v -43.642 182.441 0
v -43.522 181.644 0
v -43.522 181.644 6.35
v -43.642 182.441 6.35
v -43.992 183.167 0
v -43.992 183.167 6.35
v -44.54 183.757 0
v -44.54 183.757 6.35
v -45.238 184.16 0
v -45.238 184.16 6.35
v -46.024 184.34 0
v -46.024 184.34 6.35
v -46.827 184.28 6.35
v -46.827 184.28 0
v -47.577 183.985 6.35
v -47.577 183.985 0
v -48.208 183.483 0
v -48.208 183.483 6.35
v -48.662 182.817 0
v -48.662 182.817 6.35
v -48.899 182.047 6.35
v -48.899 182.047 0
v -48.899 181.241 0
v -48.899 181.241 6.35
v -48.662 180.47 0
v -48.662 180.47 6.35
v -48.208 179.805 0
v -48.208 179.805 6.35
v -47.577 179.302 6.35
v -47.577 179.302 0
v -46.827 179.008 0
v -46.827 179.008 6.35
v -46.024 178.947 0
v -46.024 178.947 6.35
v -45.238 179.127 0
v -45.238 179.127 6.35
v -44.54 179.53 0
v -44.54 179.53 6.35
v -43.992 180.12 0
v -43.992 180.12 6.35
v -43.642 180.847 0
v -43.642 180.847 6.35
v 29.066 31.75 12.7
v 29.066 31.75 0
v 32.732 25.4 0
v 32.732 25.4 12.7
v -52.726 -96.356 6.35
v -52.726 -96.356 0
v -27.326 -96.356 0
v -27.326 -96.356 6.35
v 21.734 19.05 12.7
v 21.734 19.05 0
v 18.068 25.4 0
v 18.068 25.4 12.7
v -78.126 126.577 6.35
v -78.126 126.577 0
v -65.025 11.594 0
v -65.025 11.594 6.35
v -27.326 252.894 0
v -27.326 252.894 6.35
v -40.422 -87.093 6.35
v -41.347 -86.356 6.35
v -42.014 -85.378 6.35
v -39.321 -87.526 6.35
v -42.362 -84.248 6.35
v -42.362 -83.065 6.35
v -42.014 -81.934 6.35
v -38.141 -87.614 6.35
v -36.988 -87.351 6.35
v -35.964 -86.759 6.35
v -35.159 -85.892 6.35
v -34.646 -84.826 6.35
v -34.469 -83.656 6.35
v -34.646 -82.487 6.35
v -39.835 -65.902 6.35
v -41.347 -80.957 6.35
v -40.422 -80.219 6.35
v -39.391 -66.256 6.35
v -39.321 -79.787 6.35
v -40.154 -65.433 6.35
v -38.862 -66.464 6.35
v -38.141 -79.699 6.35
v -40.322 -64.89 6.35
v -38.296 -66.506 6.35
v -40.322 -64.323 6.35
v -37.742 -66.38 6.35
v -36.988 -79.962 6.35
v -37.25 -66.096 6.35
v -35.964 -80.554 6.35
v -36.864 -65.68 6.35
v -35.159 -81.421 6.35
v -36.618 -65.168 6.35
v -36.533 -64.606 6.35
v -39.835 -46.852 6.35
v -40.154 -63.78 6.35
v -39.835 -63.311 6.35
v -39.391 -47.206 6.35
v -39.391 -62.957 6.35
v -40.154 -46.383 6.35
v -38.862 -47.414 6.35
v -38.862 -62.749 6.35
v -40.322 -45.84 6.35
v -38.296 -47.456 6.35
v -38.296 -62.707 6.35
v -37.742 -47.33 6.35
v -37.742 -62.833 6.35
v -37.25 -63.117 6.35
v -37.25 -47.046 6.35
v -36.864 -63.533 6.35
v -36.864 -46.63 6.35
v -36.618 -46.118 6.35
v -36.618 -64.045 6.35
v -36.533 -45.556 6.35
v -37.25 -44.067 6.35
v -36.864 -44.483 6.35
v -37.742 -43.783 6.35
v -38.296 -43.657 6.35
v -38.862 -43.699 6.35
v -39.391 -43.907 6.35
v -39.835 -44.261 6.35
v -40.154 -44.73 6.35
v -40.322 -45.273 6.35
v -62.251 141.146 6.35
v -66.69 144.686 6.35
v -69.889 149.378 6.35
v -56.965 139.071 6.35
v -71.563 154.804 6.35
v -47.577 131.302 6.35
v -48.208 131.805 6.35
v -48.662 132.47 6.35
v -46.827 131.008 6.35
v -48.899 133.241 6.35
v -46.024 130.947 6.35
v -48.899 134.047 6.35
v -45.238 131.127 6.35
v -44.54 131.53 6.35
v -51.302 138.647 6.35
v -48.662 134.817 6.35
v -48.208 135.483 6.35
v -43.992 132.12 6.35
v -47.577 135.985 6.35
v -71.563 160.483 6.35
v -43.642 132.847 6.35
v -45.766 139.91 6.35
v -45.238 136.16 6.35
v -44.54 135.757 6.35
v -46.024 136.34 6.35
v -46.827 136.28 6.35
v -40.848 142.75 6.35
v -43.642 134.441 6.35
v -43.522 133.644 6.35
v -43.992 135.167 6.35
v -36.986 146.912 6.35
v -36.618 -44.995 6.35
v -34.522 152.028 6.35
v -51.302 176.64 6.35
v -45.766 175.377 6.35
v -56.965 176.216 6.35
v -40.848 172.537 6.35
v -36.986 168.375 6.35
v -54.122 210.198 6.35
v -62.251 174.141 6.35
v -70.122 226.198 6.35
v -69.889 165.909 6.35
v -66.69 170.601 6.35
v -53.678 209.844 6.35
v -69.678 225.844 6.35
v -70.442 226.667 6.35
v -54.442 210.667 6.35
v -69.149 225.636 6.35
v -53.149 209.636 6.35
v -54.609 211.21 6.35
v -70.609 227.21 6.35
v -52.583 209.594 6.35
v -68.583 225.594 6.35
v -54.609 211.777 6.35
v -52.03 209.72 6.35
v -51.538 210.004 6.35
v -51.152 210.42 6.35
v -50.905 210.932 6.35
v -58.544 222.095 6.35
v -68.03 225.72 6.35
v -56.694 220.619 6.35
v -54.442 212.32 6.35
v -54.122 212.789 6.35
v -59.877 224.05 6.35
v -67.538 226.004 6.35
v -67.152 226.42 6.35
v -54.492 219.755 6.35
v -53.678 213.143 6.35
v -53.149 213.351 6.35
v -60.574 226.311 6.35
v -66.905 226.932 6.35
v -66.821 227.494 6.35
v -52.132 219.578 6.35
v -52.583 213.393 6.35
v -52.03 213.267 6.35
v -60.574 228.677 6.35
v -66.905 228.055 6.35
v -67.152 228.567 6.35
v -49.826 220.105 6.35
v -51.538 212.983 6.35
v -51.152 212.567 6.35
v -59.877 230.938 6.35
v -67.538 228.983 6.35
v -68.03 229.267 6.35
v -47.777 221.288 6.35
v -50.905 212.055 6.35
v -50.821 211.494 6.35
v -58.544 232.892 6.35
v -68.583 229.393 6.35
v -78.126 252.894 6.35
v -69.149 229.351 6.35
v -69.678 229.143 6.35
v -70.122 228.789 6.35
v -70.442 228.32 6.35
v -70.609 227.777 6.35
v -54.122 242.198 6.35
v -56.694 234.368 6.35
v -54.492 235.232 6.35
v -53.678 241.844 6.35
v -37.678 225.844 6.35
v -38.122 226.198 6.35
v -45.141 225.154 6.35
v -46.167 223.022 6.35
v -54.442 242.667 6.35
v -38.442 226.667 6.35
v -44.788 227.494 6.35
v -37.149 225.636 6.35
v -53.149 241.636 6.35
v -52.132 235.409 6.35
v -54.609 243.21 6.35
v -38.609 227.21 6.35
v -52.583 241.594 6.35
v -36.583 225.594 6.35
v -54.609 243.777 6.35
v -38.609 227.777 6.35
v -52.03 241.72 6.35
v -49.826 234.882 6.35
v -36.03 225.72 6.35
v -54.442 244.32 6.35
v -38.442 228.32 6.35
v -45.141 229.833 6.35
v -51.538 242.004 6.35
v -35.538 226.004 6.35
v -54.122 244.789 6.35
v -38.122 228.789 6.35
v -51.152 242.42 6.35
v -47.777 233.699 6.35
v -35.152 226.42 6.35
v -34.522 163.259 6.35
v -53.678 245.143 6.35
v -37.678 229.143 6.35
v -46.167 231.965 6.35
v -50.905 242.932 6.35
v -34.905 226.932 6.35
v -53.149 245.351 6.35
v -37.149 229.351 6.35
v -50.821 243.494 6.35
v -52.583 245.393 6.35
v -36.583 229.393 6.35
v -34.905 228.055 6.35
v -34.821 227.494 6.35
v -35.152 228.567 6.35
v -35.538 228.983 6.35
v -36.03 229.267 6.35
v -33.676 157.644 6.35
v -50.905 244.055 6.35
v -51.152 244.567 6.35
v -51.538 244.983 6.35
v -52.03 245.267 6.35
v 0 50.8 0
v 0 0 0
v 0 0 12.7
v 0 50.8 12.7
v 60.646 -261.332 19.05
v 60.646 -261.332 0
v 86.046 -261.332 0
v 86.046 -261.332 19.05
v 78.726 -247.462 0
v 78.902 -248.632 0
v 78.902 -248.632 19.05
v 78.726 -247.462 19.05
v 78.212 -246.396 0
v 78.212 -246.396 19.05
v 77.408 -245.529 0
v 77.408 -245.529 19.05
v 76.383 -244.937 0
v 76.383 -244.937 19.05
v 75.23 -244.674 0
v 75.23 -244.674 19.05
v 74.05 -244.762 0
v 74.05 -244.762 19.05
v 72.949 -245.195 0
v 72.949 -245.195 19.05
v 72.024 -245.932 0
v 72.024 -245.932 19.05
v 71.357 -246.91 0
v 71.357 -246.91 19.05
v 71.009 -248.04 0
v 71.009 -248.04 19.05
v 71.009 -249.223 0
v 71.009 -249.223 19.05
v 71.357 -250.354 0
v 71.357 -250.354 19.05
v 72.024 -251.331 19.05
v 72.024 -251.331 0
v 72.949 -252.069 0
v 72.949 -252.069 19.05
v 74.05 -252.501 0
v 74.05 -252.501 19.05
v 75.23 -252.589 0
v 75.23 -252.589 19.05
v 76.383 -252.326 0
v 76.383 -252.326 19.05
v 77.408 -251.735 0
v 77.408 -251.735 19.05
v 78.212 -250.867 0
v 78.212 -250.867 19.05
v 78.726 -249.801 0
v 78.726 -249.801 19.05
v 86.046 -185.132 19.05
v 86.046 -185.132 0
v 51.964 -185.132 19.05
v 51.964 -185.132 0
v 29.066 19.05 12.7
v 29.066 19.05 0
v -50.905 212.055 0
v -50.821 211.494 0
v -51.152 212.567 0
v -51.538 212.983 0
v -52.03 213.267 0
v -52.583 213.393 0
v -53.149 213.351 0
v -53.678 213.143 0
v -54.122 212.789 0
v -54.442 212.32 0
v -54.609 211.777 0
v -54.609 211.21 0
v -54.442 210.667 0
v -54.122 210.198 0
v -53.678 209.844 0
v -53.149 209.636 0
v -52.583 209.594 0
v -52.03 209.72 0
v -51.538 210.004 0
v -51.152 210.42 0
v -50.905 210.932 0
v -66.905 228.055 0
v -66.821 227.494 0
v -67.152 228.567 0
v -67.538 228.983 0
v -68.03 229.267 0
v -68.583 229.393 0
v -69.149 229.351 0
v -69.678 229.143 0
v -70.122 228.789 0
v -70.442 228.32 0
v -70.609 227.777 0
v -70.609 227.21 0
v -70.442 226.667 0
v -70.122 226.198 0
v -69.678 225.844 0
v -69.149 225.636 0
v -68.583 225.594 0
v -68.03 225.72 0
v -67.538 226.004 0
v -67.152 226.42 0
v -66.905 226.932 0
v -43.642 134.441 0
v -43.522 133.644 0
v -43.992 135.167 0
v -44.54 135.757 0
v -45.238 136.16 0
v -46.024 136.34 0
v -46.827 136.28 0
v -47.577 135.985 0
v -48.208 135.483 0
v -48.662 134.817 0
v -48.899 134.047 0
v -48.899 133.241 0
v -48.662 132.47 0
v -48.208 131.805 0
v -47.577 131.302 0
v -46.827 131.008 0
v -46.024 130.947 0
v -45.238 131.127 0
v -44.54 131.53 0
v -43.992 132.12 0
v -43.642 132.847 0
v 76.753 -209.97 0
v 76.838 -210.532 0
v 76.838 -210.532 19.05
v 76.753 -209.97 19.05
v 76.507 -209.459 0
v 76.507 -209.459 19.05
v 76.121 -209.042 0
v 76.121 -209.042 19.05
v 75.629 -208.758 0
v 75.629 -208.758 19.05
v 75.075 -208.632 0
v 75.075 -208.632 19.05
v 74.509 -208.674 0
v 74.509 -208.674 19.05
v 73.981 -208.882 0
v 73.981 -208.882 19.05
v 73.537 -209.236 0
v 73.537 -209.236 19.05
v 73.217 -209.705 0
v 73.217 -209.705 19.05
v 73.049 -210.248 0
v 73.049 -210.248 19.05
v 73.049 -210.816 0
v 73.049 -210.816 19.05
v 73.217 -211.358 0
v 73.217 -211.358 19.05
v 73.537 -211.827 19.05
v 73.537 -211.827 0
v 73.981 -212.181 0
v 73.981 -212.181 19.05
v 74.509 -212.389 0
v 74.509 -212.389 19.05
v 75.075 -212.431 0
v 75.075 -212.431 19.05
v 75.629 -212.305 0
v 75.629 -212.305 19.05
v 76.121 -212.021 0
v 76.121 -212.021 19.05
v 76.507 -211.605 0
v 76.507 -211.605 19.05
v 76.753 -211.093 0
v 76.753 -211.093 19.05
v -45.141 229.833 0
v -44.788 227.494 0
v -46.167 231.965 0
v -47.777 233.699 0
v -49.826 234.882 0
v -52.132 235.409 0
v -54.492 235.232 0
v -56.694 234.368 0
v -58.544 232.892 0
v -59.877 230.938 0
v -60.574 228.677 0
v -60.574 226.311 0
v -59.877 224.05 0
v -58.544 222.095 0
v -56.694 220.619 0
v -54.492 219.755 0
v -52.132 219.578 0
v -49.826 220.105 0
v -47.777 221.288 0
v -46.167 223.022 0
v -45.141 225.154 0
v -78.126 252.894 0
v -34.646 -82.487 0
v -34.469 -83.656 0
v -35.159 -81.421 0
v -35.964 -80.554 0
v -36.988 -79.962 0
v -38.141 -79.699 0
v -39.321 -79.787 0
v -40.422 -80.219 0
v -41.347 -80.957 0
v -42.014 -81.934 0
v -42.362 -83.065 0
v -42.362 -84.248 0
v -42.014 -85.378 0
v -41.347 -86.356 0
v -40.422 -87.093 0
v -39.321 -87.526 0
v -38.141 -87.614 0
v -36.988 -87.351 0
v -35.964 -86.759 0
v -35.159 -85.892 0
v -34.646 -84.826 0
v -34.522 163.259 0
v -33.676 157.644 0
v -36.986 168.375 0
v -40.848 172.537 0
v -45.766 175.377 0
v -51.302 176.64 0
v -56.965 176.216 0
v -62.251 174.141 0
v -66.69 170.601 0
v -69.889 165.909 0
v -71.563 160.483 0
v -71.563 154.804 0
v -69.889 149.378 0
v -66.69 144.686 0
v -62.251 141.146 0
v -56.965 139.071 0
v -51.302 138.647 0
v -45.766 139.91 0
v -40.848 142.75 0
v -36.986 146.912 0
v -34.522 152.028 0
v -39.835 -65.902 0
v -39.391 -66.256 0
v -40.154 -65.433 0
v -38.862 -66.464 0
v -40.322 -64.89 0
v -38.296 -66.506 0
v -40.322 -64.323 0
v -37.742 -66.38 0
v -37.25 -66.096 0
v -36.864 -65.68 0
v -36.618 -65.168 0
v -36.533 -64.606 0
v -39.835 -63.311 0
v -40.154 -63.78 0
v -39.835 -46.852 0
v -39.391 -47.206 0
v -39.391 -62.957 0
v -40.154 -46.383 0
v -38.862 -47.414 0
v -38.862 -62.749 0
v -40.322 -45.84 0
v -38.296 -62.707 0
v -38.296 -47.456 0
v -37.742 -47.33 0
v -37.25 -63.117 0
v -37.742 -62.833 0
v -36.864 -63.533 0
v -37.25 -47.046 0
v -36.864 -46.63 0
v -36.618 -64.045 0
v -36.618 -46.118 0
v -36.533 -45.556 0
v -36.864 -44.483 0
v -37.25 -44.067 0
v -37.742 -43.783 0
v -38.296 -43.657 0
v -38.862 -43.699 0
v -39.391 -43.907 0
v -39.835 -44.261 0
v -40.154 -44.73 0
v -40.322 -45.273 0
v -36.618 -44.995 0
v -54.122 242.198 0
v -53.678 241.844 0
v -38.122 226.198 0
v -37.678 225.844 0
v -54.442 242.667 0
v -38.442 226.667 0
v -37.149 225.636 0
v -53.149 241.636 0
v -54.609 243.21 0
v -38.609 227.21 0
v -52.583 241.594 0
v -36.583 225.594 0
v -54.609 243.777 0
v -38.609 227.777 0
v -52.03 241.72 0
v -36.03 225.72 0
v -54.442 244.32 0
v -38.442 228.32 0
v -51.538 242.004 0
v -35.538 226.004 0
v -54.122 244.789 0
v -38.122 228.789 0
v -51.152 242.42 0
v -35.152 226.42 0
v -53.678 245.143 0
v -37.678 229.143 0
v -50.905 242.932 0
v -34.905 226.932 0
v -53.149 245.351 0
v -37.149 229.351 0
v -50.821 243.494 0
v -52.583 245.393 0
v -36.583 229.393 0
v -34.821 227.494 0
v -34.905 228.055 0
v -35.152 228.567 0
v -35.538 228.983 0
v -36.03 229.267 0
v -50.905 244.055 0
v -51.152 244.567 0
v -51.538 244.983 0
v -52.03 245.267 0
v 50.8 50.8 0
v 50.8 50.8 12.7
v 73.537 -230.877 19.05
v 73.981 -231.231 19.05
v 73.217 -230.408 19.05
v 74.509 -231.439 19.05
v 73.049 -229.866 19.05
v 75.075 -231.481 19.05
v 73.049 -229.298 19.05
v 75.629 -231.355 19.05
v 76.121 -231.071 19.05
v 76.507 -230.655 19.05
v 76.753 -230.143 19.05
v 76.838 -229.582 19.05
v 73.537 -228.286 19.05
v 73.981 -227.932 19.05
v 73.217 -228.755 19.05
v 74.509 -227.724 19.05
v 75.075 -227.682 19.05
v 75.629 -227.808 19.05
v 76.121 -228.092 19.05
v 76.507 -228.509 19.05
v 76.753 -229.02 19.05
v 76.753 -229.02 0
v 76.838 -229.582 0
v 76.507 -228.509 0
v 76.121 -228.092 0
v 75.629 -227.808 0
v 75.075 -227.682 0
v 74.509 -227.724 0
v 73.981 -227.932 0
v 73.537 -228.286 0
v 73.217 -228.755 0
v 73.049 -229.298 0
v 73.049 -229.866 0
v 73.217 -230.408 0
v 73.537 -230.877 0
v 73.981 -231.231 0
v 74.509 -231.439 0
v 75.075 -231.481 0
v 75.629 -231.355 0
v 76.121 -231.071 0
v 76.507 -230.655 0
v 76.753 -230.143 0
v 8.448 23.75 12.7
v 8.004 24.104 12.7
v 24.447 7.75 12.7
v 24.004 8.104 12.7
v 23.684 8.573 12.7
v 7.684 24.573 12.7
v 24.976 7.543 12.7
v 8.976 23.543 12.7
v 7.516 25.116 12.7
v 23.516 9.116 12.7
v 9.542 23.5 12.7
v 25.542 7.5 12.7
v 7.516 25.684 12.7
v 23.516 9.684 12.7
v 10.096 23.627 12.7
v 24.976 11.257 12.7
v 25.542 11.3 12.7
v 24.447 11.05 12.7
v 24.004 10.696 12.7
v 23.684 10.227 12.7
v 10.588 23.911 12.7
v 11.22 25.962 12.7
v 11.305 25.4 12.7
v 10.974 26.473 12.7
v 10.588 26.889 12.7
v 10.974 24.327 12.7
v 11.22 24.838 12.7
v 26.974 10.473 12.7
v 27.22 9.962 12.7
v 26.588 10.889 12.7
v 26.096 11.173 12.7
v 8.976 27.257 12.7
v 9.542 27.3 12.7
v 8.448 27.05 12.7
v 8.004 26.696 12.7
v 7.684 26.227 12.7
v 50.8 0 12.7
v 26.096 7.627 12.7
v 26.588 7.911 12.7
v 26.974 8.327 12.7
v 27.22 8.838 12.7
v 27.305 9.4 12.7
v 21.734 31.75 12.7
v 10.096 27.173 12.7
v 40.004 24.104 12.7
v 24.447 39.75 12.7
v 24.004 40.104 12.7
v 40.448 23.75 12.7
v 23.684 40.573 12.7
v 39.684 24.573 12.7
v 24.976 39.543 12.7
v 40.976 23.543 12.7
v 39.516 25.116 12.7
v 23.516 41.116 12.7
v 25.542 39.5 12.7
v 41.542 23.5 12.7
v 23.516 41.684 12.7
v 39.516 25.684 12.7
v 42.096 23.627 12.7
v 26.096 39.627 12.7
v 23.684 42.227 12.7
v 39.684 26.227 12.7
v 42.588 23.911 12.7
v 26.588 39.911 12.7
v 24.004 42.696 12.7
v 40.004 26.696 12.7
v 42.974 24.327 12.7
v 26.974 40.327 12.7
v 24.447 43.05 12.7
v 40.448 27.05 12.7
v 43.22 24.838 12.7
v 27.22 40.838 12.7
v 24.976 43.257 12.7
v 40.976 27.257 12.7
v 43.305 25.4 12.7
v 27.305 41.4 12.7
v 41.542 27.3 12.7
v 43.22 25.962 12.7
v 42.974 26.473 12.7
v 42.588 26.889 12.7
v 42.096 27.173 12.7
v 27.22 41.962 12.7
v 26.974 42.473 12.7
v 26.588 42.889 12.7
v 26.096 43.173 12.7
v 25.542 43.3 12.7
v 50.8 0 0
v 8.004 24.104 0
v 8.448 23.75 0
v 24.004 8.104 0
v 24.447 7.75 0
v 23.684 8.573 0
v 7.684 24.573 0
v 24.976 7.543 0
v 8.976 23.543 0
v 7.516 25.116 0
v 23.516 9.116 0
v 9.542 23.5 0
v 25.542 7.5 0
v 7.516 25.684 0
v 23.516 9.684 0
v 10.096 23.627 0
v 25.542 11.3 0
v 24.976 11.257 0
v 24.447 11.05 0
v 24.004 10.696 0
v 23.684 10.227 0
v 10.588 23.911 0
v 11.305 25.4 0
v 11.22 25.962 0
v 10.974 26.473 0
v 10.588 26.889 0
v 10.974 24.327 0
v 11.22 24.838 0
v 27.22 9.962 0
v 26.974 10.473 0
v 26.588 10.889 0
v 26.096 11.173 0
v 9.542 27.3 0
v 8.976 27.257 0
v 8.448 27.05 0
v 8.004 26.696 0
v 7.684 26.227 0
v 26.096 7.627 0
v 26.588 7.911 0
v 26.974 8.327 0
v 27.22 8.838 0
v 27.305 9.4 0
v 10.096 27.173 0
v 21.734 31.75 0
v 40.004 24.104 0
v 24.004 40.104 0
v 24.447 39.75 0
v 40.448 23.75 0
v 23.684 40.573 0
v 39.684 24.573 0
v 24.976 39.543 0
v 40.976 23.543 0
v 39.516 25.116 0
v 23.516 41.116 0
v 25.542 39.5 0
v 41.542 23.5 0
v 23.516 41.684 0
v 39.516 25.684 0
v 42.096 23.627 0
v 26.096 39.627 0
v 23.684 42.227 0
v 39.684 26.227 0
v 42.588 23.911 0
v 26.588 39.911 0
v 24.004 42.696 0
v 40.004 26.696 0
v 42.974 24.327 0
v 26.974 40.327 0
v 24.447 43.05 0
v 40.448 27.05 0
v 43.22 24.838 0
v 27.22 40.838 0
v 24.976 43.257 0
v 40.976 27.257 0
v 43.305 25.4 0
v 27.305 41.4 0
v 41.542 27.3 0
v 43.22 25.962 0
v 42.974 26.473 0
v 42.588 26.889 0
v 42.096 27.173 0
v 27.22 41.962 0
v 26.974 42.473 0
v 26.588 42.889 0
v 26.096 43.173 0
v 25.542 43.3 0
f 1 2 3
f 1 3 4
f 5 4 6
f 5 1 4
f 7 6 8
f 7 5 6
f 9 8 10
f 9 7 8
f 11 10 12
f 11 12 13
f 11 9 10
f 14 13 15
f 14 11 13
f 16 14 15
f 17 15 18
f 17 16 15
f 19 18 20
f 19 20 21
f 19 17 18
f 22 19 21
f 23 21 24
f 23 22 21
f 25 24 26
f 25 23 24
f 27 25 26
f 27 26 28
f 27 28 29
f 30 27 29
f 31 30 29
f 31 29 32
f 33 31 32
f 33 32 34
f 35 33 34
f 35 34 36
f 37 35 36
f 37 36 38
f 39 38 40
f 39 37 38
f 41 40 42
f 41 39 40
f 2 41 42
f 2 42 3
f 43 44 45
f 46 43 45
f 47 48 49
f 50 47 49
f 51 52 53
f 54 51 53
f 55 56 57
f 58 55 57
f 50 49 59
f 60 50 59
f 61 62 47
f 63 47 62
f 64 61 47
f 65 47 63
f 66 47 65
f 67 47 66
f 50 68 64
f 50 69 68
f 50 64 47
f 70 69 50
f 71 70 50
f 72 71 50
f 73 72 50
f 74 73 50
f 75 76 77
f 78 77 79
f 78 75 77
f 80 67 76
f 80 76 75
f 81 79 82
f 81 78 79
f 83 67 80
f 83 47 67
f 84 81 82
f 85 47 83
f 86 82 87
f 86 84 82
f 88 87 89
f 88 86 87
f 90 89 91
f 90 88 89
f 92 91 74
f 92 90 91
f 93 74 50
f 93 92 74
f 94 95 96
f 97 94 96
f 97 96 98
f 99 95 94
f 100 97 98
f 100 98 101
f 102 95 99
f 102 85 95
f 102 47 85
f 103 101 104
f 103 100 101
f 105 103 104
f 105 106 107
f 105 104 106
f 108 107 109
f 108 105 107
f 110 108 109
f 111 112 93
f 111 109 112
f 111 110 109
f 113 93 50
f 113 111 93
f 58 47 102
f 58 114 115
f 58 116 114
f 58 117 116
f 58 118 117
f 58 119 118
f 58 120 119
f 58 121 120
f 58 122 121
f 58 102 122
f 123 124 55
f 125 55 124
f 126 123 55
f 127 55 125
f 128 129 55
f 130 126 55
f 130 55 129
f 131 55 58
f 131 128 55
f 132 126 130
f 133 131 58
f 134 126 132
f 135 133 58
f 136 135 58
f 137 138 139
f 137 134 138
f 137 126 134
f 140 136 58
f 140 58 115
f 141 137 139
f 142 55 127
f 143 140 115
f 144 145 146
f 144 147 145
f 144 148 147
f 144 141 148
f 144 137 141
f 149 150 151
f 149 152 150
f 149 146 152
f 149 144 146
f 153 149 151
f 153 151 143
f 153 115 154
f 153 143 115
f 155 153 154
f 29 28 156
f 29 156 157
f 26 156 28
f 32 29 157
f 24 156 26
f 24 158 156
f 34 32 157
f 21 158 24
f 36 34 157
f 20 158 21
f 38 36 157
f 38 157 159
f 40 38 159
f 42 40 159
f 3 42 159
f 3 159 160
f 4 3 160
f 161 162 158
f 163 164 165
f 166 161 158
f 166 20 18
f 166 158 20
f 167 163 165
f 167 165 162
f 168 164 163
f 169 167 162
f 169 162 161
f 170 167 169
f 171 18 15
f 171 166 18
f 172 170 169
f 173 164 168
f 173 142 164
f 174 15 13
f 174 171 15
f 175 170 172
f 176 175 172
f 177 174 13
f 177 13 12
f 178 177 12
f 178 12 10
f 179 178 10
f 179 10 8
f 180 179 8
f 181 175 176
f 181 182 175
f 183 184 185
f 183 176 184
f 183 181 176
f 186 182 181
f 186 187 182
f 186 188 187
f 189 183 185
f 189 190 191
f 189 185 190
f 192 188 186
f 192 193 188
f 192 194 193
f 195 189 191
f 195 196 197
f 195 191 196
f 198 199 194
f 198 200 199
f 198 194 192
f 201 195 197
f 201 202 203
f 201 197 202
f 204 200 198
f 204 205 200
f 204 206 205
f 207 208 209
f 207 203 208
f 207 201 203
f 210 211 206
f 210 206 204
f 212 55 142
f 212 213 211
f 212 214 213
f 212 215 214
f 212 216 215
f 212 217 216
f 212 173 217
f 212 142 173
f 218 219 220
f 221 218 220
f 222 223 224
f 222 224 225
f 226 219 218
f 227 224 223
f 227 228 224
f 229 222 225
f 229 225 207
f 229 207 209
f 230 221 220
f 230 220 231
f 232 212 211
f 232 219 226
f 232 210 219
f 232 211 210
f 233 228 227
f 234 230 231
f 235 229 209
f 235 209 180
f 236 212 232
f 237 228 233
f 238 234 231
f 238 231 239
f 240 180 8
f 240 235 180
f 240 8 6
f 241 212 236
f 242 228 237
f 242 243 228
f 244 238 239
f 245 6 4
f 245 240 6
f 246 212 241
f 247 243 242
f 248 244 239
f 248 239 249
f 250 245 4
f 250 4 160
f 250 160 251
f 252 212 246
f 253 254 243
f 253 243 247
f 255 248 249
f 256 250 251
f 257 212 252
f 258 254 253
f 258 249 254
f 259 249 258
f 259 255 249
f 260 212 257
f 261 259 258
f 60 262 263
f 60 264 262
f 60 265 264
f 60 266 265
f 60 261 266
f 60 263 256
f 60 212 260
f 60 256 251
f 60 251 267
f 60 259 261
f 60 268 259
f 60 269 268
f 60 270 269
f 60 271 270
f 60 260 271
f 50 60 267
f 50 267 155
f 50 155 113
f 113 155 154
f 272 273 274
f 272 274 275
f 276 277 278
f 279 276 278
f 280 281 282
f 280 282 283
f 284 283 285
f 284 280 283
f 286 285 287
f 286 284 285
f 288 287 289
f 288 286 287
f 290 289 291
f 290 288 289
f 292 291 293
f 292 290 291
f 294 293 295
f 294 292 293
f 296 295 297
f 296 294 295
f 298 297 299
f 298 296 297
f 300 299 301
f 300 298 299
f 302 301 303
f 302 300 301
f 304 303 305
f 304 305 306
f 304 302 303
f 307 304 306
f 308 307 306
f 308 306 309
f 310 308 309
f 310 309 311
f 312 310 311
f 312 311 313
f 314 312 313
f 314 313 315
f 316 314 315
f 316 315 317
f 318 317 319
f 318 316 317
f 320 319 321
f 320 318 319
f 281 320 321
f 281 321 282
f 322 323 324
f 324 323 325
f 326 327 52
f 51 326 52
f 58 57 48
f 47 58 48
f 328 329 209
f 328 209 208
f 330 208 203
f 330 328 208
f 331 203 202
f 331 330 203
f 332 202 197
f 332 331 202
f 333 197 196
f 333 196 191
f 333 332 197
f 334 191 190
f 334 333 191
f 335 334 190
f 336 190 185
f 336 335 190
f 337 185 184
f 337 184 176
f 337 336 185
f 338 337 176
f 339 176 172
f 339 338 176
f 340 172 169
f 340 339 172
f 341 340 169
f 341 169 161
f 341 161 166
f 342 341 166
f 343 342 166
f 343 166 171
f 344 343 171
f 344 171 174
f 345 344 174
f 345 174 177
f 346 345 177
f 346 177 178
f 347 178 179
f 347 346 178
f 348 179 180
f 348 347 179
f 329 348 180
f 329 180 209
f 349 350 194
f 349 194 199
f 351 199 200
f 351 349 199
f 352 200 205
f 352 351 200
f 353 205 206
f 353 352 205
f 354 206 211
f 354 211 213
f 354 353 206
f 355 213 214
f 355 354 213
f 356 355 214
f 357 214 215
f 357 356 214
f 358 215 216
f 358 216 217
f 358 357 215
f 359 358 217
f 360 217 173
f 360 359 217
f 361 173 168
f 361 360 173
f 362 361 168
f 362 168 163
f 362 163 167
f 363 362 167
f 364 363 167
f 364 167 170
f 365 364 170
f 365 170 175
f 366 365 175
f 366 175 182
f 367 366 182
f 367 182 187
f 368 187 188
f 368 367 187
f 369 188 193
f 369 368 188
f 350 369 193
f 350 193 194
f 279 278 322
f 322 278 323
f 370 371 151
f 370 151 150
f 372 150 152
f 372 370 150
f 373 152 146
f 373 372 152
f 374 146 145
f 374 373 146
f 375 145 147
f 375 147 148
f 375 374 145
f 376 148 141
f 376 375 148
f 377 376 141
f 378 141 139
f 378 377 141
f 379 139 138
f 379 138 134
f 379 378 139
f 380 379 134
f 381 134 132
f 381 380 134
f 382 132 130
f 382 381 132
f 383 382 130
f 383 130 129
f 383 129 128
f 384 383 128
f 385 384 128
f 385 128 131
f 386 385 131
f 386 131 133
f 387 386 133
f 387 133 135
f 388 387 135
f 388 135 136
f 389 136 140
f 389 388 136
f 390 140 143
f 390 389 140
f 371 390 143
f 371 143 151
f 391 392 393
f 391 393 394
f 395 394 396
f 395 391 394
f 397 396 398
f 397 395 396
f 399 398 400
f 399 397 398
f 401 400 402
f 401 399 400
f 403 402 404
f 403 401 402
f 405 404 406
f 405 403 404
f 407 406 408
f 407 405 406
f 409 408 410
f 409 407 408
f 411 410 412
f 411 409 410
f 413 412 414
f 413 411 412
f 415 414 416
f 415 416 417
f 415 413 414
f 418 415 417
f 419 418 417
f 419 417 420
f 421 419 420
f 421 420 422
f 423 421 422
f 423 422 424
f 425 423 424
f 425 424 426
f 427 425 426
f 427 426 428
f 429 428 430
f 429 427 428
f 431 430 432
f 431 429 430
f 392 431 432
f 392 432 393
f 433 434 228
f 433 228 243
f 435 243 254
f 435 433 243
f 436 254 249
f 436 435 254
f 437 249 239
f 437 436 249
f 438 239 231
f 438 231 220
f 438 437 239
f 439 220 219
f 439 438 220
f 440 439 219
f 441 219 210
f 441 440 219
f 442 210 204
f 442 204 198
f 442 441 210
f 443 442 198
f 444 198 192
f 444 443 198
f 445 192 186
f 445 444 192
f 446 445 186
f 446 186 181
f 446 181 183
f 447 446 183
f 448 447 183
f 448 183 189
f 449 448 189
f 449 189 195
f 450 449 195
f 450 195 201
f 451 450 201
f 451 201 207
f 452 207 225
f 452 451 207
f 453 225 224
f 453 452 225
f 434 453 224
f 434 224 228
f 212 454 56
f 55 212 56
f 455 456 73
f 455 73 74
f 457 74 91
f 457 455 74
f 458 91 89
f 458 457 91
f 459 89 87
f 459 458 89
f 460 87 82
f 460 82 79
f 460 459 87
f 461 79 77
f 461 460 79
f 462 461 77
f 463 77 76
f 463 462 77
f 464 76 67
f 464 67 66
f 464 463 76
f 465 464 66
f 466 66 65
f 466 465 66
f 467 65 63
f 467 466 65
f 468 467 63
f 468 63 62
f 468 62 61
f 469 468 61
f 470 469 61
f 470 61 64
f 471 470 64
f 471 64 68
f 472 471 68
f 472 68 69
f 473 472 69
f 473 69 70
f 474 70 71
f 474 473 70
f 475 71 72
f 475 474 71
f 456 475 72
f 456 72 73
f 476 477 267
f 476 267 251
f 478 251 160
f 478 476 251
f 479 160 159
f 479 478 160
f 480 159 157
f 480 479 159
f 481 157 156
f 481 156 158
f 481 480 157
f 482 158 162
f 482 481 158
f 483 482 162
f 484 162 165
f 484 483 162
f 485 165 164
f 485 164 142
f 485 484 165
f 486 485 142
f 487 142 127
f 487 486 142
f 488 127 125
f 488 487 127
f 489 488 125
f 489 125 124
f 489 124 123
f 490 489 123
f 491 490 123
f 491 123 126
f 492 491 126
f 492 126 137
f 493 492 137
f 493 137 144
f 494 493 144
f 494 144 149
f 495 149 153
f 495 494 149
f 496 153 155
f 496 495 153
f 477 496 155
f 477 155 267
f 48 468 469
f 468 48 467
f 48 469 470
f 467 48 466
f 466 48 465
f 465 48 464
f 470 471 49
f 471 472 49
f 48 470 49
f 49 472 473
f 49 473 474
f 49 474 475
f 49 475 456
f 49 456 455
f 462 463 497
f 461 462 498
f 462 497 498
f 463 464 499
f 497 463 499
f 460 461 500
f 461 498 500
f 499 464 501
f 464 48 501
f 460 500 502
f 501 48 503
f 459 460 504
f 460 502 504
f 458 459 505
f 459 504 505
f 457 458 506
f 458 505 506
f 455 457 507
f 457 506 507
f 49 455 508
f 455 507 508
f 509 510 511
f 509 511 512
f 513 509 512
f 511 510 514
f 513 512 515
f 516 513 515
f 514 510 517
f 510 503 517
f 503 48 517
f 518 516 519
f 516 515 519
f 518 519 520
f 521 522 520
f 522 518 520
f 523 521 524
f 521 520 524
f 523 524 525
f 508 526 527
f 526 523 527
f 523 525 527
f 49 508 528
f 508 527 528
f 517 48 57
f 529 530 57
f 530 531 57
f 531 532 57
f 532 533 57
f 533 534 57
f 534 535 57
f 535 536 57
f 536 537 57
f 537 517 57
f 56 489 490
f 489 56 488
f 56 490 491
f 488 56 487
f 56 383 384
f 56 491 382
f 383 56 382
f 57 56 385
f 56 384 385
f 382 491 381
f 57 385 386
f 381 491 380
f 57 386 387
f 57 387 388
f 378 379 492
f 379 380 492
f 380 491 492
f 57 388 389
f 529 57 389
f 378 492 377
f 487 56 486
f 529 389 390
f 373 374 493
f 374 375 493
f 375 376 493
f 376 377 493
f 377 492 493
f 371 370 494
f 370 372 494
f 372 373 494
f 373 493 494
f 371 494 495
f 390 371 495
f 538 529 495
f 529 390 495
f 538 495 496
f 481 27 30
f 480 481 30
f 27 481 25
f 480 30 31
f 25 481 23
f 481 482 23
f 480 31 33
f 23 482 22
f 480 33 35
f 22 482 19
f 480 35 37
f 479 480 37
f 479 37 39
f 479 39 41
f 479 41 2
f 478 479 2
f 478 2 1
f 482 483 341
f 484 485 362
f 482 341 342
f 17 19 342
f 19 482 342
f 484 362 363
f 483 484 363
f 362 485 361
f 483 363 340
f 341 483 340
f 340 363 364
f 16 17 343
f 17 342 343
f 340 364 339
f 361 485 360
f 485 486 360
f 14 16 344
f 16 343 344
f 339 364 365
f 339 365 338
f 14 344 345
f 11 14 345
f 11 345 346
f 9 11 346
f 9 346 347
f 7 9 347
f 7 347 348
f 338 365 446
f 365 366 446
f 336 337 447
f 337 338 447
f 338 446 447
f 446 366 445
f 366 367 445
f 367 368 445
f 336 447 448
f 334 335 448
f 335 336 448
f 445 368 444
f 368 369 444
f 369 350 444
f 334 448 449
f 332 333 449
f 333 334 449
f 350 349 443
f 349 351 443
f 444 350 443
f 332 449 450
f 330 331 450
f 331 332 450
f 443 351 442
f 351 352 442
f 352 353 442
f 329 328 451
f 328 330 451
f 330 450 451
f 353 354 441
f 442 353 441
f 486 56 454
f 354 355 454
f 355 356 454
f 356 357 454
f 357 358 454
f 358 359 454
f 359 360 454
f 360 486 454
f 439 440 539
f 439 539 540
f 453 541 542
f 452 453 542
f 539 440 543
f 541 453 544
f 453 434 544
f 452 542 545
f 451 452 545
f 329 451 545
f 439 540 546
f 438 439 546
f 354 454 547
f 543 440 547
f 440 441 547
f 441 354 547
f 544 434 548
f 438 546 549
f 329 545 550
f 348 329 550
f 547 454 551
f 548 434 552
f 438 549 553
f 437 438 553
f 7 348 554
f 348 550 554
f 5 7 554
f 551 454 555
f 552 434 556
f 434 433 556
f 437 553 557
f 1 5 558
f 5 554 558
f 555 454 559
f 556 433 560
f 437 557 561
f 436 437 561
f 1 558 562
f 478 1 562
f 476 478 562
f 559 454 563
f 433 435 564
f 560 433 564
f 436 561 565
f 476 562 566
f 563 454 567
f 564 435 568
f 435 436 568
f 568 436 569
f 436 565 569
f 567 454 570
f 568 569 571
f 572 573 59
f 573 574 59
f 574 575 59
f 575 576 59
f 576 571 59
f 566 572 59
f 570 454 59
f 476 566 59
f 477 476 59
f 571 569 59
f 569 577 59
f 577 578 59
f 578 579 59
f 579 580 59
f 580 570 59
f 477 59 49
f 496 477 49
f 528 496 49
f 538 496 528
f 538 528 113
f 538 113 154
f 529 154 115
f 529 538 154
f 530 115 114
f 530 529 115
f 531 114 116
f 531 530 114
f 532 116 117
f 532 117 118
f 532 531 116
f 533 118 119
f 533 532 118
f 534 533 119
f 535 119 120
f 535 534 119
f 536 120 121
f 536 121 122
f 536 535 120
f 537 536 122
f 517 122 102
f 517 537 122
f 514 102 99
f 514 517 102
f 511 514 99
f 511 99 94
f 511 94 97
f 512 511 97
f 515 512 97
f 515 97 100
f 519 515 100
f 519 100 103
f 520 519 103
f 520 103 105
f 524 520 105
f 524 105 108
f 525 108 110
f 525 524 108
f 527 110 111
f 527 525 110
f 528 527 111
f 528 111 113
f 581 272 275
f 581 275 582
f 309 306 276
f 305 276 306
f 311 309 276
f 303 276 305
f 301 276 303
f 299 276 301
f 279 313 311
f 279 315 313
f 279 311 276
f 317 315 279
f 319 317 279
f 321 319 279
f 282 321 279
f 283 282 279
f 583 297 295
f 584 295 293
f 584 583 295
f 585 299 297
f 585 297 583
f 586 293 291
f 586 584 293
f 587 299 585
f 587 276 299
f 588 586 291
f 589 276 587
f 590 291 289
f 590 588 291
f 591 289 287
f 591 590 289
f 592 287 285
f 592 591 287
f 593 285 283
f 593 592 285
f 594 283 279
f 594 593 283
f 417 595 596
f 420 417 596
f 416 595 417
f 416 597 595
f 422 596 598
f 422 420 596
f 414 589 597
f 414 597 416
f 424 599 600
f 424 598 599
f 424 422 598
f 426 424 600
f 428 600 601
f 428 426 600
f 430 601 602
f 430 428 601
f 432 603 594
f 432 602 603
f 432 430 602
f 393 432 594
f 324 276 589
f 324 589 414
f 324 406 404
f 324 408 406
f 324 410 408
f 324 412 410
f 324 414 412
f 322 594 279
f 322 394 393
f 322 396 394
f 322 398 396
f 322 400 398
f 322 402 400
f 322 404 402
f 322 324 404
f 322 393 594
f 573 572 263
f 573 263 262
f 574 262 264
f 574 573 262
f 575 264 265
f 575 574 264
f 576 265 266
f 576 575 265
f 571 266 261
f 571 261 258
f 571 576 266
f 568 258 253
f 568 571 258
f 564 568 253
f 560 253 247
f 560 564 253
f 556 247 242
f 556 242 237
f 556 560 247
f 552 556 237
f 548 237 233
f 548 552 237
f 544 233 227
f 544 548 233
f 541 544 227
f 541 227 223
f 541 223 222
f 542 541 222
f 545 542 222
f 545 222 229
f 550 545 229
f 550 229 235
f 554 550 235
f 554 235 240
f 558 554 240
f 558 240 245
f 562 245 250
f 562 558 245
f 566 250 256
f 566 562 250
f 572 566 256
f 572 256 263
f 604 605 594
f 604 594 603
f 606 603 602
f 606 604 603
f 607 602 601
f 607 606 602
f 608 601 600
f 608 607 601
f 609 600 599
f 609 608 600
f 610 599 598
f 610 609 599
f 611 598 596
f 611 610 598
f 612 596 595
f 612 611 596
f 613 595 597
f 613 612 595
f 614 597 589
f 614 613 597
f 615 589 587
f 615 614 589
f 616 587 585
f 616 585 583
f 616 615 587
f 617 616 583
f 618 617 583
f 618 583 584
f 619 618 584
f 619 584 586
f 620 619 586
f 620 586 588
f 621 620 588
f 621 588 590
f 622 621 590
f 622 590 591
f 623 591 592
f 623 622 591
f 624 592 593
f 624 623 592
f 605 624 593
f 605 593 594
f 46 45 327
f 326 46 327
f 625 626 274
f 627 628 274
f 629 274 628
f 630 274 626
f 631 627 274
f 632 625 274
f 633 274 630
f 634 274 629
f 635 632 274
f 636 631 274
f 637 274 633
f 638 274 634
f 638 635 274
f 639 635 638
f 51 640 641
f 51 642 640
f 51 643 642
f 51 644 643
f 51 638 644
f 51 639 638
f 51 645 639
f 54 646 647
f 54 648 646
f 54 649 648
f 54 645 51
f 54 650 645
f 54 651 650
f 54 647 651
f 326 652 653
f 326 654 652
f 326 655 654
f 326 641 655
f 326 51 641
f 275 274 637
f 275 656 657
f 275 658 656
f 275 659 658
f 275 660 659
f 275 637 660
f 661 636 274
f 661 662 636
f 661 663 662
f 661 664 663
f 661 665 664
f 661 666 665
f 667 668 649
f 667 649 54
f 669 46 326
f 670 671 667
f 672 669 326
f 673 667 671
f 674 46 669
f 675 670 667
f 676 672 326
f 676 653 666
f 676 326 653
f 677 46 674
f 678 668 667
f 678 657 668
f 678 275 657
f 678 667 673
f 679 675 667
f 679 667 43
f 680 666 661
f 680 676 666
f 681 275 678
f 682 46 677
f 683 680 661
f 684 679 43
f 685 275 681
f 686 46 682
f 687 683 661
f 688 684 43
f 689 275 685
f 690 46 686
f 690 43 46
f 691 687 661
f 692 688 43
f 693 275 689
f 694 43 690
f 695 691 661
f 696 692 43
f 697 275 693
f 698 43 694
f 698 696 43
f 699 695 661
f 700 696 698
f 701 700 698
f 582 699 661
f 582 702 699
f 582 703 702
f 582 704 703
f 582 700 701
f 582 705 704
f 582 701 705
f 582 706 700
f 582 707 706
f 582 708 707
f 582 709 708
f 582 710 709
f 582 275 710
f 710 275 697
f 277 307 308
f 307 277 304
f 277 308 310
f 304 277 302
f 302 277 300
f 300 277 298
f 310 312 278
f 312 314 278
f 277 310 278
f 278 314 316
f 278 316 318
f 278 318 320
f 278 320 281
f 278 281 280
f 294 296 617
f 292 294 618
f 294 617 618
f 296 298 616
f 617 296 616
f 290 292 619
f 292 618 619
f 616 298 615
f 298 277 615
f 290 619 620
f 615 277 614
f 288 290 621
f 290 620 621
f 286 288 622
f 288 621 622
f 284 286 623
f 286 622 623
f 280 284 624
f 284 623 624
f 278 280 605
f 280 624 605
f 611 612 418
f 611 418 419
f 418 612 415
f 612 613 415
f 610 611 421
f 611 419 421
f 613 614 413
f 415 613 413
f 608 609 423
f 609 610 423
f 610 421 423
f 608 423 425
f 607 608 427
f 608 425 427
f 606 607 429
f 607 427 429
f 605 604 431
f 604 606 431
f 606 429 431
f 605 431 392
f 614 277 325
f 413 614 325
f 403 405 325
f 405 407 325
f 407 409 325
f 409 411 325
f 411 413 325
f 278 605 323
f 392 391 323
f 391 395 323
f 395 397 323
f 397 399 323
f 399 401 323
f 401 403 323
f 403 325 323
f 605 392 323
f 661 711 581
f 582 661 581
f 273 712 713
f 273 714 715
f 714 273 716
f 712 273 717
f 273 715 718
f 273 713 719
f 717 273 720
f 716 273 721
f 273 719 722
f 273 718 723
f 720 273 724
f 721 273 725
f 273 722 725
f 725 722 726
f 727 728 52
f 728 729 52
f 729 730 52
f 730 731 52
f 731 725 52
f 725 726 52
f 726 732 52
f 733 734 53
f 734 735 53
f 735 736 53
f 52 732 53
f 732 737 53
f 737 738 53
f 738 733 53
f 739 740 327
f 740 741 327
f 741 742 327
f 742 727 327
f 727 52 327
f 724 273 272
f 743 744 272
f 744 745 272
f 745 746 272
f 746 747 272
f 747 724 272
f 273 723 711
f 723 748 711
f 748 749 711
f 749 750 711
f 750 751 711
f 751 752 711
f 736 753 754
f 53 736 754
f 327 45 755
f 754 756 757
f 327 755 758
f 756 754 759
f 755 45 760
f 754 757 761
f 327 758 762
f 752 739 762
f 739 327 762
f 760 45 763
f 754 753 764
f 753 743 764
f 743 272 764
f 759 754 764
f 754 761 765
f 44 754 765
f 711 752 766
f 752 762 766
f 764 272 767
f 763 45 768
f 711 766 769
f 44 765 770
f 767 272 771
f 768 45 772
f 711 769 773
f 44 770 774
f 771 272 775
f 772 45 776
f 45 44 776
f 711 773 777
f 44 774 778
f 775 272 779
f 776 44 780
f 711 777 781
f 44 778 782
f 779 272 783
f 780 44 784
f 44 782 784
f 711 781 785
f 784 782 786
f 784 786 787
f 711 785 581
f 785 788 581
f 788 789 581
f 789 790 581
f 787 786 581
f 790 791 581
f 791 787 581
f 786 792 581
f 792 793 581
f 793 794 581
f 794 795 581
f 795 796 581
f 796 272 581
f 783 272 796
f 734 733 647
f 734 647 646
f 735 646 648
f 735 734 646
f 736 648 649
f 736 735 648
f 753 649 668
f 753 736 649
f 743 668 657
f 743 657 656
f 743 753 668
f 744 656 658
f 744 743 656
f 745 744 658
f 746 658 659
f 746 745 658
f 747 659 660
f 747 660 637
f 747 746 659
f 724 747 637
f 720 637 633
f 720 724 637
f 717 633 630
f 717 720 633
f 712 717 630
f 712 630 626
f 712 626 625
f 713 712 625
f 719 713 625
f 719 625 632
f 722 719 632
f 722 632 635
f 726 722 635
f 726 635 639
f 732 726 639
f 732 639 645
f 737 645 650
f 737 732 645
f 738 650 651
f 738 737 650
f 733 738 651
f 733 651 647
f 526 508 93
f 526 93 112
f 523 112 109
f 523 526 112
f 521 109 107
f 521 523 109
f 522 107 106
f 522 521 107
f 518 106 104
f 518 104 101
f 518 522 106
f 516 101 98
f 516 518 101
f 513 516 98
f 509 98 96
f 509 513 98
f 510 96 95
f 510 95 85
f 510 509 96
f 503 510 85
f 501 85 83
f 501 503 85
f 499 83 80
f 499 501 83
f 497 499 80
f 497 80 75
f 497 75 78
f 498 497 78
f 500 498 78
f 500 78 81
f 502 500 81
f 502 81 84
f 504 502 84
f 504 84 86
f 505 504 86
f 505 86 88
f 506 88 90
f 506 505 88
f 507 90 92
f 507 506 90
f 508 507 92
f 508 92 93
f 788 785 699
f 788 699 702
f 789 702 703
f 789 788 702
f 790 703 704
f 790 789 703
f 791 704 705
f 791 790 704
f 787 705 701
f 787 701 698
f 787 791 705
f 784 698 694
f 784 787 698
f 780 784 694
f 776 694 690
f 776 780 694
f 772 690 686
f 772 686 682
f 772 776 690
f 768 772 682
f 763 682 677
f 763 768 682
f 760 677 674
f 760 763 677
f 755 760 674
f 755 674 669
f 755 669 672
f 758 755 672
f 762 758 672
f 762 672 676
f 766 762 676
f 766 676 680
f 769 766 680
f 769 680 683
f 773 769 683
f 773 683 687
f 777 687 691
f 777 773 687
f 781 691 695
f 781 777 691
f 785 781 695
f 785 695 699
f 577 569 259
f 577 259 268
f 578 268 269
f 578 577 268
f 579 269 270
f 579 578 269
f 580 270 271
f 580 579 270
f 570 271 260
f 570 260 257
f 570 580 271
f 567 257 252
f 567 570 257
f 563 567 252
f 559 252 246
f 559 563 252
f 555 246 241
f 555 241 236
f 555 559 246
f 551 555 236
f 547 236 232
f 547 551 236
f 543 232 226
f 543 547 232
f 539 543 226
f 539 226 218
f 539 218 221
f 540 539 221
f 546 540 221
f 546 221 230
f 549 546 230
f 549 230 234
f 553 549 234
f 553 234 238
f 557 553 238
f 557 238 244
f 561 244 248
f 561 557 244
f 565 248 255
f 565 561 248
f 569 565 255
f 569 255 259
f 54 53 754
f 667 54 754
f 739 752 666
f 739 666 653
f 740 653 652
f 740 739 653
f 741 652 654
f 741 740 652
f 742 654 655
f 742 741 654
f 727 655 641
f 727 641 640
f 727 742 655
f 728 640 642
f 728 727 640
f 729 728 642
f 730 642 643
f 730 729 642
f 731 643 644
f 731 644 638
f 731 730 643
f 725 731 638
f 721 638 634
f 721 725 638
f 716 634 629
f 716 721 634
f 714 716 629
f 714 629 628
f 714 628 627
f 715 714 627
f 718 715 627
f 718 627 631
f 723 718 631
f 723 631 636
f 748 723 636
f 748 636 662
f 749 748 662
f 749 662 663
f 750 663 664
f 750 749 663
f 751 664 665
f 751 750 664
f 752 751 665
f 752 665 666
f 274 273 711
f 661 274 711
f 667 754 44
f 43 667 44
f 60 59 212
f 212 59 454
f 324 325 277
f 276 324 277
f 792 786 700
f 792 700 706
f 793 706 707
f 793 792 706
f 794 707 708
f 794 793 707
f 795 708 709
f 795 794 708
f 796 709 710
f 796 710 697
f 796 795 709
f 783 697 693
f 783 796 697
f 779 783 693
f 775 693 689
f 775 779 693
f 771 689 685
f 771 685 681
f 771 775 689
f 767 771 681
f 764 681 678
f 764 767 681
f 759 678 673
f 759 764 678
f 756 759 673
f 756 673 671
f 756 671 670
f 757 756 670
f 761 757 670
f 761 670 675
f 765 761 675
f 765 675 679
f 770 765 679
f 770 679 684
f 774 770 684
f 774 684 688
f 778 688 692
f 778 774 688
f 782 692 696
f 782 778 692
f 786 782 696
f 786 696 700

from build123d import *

# Parameters (mm, degrees)
F0_R     = 3.96875
F0_R_2   = 1.905
F0_R_3   = 7.9375
F0_R_4   = 19.05
F0_R_5   = 2.703777
F1_DEPTH = 6.35
F2_W     = 50.8
F2_H     = 50.8
F2_R     = 1.905
F3_DEPTH = 12.7
F4_R     = 3.96875
F4_R_2   = 1.905
F5_DEPTH = 19.05


with BuildPart() as f1:
    # F0 (on Top) → F1 (new body)
    with BuildSketch(Plane.XY):
        Polygon((-27.325561, -96.356438), (-27.325561, 11.593562), (-65.02491, 11.593562), (-52.725561, -96.356438), align=None)
        with Locations((-38.438061, -83.656438)):
            Circle(F0_R, mode=Mode.SUBTRACT)
        with Locations((-38.438061, -64.606438)):
            Circle(F0_R_2, mode=Mode.SUBTRACT)
        with Locations((-38.438061, -45.556438)):
            Circle(F0_R_2, mode=Mode.SUBTRACT)
        Polygon((-27.325561, 252.893562), (-78.125561, 252.893562), (-78.125561, 126.576501), (-65.02491, 11.593562), (-27.325561, 11.593562), align=None)
        with Locations((-68.725561, 227.493562)):
            Circle(F0_R_2, mode=Mode.SUBTRACT)
        with Locations((-52.725561, 211.493562)):
            Circle(F0_R_2, mode=Mode.SUBTRACT)
        with Locations((-52.725561, 227.493562)):
            Circle(F0_R_3, mode=Mode.SUBTRACT)
        with Locations((-52.725561, 243.493562)):
            Circle(F0_R_2, mode=Mode.SUBTRACT)
        with Locations((-52.725561, 157.643562)):
            Circle(F0_R_4, mode=Mode.SUBTRACT)
        with Locations((-46.225561, 133.643562)):
            Circle(F0_R_5, mode=Mode.SUBTRACT)
        with Locations((-46.225561, 181.643562)):
            Circle(F0_R_5, mode=Mode.SUBTRACT)
        with Locations((-36.725561, 227.493562)):
            Circle(F0_R_2, mode=Mode.SUBTRACT)
    extrude(amount=F1_DEPTH)


with BuildPart() as f3:
    # F2 (on Top) → F3 (new body)
    with BuildSketch(Plane.XY):
        with Locations((25.4, 25.4)):
            Rectangle(F2_W, F2_H)
        with Locations((25.4, 9.4)):
            Circle(F2_R, mode=Mode.SUBTRACT)
        with Locations((9.4, 25.4)):
            Circle(F2_R, mode=Mode.SUBTRACT)
        Polygon((18.067652, 25.4), (21.733826, 31.75), (29.066174, 31.75), (32.732348, 25.4), (29.066174, 19.05), (21.733826, 19.05), align=None, mode=Mode.SUBTRACT)
        with Locations((41.4, 25.4)):
            Circle(F2_R, mode=Mode.SUBTRACT)
        with Locations((25.4, 41.4)):
            Circle(F2_R, mode=Mode.SUBTRACT)
    extrude(amount=F3_DEPTH)


with BuildPart() as f5:
    # F4 (on Top) → F5 (new body)
    with BuildSketch(Plane.XY):
        Polygon((51.963728, -185.131654), (60.645621, -261.331654), (86.045621, -261.331654), (86.045621, -185.131654), align=None)
        with Locations((74.933121, -248.631654)):
            Circle(F4_R, mode=Mode.SUBTRACT)
        with Locations((74.933121, -229.581654)):
            Circle(F4_R_2, mode=Mode.SUBTRACT)
        with Locations((74.933121, -210.531654)):
            Circle(F4_R_2, mode=Mode.SUBTRACT)
    extrude(amount=F5_DEPTH)


solid = Compound([f1.part, f3.part, f5.part])
